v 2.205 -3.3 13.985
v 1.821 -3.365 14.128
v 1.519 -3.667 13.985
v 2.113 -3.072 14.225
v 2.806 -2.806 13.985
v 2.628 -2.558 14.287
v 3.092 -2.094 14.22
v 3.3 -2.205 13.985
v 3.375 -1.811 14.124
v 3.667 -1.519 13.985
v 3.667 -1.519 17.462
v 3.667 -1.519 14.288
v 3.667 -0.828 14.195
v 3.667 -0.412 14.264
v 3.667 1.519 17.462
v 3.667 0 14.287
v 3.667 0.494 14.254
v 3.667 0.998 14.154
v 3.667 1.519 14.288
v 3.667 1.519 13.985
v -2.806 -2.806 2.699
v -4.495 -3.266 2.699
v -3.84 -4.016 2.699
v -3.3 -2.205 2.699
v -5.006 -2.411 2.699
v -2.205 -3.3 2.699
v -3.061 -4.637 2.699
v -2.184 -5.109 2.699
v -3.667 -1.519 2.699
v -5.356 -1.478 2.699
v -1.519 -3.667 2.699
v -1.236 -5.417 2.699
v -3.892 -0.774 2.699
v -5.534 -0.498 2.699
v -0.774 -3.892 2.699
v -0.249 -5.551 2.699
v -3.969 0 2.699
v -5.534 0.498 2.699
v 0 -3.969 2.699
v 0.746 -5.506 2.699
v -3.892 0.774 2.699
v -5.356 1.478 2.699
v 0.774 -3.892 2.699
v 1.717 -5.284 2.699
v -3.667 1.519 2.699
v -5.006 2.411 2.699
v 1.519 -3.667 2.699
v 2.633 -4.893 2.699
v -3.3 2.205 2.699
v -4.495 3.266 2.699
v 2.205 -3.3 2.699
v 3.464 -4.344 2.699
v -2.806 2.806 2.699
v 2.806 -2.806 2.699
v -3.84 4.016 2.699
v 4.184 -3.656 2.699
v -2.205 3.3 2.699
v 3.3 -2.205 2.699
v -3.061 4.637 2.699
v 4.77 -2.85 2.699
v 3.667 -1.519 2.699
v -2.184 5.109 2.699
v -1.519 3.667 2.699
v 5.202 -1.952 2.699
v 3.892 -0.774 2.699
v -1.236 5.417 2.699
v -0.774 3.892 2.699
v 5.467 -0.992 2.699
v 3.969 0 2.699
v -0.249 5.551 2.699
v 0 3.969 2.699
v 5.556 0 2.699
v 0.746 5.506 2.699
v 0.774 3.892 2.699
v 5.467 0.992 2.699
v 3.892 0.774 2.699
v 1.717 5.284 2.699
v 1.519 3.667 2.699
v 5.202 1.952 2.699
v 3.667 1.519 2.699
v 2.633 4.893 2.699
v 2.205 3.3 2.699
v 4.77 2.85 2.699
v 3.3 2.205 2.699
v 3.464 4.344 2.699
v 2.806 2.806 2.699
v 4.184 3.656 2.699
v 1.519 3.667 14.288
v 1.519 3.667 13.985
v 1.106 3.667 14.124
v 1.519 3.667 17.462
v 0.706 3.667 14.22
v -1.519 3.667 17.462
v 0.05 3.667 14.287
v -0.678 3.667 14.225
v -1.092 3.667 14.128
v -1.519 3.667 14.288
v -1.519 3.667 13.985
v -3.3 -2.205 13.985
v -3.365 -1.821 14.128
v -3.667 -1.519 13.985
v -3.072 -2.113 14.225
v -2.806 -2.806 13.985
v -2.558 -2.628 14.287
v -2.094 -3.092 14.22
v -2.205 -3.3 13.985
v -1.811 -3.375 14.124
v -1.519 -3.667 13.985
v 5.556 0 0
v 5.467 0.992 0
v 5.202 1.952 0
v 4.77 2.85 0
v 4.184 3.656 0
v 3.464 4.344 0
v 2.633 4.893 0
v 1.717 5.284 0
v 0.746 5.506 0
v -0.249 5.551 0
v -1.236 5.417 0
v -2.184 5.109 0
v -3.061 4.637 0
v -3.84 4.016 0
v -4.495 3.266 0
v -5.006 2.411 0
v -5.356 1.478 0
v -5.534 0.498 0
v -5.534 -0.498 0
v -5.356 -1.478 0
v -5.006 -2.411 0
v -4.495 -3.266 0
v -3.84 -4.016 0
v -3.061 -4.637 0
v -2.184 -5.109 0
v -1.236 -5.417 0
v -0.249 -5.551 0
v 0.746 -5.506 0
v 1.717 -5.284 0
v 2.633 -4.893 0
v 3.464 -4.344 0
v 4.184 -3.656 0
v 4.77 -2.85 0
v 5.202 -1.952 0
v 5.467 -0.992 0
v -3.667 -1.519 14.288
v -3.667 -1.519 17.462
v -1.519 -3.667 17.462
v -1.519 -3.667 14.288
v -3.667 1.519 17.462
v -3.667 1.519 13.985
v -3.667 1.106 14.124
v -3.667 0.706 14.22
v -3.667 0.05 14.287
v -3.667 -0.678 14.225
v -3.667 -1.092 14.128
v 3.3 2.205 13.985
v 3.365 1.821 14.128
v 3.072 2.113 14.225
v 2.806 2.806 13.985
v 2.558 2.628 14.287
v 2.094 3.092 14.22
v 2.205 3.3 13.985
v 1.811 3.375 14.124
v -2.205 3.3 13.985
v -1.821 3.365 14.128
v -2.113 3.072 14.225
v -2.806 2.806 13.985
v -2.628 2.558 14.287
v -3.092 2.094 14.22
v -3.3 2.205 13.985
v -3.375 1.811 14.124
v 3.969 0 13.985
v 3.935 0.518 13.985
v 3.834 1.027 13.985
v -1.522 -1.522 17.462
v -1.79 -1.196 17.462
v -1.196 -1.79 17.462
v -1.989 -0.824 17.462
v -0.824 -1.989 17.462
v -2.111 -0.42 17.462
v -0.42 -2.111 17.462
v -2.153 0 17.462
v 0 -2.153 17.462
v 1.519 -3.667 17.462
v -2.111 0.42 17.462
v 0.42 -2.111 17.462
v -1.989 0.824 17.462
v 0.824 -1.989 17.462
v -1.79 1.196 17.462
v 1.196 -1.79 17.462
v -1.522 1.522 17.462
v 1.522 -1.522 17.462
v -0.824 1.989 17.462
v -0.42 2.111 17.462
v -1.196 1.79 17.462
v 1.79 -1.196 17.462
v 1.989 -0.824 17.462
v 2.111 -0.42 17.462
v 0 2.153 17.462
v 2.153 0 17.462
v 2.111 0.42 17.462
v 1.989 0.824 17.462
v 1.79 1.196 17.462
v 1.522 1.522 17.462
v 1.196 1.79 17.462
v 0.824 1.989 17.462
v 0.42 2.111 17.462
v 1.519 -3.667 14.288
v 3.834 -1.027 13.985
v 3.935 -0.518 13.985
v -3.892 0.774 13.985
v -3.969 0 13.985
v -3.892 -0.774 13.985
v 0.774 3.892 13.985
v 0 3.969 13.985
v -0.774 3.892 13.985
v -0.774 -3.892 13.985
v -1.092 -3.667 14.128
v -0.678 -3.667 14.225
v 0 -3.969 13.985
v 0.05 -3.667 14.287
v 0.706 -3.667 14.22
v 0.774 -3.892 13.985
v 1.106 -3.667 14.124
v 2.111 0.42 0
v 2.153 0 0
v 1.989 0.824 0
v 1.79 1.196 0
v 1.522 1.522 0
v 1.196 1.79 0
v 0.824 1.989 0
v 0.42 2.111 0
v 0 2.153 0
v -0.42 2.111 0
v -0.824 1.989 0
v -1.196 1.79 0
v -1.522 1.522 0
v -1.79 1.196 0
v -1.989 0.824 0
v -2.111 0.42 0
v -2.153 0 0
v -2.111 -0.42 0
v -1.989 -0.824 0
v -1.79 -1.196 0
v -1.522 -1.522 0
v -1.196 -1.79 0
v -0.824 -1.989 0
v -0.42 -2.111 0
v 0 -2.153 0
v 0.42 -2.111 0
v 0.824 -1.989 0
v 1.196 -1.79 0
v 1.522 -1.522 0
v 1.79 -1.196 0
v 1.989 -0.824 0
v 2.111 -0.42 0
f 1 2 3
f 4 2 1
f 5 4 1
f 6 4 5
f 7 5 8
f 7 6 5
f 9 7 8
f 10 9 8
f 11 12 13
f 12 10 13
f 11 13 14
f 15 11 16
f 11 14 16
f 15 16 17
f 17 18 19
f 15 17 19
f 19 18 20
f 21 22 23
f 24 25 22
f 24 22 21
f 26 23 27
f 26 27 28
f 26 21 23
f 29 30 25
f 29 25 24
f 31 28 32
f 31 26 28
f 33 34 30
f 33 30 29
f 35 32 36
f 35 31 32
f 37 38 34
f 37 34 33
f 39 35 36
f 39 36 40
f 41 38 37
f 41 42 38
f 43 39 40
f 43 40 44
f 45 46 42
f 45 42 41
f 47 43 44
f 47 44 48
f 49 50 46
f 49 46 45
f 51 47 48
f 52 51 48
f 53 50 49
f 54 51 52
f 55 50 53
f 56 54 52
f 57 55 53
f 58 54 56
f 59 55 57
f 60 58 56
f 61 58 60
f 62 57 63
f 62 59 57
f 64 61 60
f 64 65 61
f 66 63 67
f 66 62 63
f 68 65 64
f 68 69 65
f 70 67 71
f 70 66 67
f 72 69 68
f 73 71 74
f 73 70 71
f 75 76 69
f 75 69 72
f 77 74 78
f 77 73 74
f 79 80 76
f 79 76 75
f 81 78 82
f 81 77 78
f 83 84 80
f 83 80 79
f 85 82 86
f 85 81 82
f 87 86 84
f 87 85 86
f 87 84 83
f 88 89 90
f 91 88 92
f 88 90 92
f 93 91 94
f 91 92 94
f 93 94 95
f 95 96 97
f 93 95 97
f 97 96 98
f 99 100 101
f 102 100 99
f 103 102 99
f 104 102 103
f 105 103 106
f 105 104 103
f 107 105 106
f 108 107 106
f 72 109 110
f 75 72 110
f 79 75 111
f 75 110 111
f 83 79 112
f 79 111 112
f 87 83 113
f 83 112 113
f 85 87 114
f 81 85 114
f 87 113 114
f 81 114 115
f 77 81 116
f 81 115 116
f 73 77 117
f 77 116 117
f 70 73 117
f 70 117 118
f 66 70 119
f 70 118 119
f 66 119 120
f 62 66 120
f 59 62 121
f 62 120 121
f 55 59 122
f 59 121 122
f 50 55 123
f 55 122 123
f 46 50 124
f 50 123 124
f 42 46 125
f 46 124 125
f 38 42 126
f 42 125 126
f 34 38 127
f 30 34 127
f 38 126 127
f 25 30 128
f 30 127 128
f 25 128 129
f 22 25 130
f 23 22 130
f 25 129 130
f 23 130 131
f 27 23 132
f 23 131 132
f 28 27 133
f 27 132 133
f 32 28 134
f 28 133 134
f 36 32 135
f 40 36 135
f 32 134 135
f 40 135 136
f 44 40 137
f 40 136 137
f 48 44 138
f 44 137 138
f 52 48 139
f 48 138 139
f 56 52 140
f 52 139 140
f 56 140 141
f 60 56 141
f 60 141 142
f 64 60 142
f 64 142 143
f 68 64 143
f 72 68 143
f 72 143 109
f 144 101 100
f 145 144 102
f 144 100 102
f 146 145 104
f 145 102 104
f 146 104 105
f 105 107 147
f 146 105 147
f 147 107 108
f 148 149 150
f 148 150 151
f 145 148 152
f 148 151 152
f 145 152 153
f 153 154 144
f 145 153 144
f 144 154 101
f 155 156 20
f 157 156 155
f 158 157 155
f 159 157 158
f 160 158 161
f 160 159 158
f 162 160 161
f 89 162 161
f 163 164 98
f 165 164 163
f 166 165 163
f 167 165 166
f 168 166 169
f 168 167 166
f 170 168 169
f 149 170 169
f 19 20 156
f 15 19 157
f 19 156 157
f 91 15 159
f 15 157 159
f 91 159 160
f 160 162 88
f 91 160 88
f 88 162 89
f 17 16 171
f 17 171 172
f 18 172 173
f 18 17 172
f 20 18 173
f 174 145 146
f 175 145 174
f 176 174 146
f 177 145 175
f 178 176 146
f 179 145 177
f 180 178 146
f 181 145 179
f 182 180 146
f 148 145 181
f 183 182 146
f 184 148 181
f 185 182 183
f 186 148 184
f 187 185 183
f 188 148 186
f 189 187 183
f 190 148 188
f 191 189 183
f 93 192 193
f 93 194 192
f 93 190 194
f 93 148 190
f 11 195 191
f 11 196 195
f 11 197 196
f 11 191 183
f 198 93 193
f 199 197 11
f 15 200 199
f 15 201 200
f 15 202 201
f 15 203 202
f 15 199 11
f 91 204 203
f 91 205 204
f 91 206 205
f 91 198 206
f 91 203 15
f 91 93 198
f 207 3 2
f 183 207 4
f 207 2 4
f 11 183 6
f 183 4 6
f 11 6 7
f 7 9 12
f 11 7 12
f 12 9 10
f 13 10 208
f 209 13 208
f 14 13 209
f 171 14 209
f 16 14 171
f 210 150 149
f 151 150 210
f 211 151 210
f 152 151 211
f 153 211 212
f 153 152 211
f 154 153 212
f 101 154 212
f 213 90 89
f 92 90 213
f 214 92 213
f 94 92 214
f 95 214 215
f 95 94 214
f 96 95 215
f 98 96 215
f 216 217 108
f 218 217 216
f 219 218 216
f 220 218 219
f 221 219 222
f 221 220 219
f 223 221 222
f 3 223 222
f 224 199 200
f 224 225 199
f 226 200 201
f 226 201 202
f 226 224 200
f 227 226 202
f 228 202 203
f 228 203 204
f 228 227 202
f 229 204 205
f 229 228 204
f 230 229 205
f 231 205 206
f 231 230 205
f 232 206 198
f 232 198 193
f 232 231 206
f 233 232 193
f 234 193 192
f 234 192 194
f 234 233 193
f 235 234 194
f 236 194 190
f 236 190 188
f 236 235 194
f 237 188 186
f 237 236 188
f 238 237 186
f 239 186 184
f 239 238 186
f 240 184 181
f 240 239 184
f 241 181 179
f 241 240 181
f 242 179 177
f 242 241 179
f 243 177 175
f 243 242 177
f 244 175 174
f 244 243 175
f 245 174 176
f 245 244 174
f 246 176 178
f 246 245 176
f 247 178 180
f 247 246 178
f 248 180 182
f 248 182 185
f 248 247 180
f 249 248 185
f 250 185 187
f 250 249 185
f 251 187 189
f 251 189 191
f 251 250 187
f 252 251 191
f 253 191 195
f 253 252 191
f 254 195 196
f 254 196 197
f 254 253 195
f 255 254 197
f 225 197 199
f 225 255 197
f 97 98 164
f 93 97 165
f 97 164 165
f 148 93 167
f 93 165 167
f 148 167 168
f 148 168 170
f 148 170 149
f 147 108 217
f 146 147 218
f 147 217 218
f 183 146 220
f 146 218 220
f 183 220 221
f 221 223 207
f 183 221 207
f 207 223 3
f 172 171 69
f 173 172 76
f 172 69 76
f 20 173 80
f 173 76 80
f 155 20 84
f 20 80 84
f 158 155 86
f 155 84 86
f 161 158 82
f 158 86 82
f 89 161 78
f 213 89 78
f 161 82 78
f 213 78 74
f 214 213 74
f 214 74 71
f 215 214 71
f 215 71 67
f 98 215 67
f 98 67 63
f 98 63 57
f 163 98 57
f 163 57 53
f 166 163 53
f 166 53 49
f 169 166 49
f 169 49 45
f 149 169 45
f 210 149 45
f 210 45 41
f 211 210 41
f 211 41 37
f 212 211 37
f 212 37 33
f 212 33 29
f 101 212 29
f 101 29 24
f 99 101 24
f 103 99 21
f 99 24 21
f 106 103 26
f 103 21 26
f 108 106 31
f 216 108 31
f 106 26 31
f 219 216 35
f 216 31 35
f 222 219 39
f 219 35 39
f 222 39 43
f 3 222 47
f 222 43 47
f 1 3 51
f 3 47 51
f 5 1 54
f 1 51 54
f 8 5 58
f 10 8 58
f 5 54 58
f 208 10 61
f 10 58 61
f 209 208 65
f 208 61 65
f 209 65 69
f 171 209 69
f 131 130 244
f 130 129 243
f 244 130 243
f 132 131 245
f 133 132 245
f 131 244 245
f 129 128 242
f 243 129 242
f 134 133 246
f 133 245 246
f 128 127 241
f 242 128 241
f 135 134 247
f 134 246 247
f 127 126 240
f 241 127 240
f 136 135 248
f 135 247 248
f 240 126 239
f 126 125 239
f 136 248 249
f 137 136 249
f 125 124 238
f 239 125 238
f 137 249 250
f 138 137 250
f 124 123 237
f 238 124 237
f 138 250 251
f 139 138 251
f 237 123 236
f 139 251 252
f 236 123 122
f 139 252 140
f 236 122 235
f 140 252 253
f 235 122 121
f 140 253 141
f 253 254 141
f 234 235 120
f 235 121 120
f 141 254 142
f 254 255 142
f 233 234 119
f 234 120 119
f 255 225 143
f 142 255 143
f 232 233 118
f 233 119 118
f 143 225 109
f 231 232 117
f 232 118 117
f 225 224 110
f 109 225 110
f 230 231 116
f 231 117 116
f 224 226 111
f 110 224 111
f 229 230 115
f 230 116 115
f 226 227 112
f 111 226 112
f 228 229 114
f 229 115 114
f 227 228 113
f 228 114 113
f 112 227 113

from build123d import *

# Parameters (mm, degrees)
F0_R         = 5.55625
F0_R_2       = 2.15265
F1_DEPTH     = 2.69875
F2_R         = 3.96875
F2_R_2       = 2.15265
F3_DEPTH     = 11.58875
F4_R         = 2.15265
F5_DEPTH     = 3.175
F6_T4_ANGLE  = 45
F6_T9_ANGLE  = 45
F6_T14_ANGLE = 45
F6_T19_ANGLE = 45
F6_T24_ANGLE = 45
F6_T29_ANGLE = 45
F6_T34_ANGLE = 45
F6_T39_ANGLE = 22.5
F6_T44_ANGLE = 22.5


# Not quite as in the source:
# - a fillet or chamfer that OpenCascade refuses, or shapes differently, is made with other operations: its cross-section is extruded or revolved along the edge and cut away or added


with BuildPart() as f1:
    # F0 (on Top) → F1 (new body)
    with BuildSketch(Plane.XY):
        Circle(F0_R)
        Circle(F0_R_2, mode=Mode.SUBTRACT)
    extrude(amount=F1_DEPTH)

    # F2 (on face) → F3 (join)
    with BuildSketch(Plane.XY.offset(2.69875)):
        Circle(F2_R)
        Circle(F2_R_2, mode=Mode.SUBTRACT)
    extrude(amount=F3_DEPTH)

    # F4 (on face) → F5 (join)
    with BuildSketch(Plane.XY.offset(14.2875)):
        Polygon((-3.6666468947, 1.5187748722), (-3.6666468947, -1.5187748722), (-1.5187748722, -3.6666468947), (1.5187748722, -3.6666468947), (3.6666468947, -1.5187748722), (3.6666468947, 1.5187748722), (1.5187748722, 3.6666468947), (-1.5187748722, 3.6666468947), align=None)
        Circle(F4_R, mode=Mode.SUBTRACT)
    extrude(amount=F5_DEPTH)

    # F6: chamfer of 0.3021076 on 7 edges, made by hand


with BuildPart() as f6_tool2:
    # F6_s3 → F6_t4 (revolve)
    with BuildSketch(Plane(origin=(0, 0, 0), x_dir=(0, 0, 1), z_dir=(0.3826834324, 0.9238795325, 0))):
        Polygon((13.9853924, -3.96875), (14.2875, -3.6666424), (14.2875, -3.96875), align=None)
    revolve(axis=Axis((0, 0, 14.2875), (0, 0, 1)), revolution_arc=F6_T4_ANGLE)

    split(bisect_by=Plane.YZ.offset(-3.6666468947), keep=Keep.BOTTOM)


with BuildPart() as f1_1:
    add(f1.part)

    # F6_t1: cut F6_tool2
    add(f6_tool2.part, mode=Mode.SUBTRACT)


with BuildPart() as f6_tool7:
    # F6_s8 → F6_t9 (revolve)
    with BuildSketch(Plane(origin=(0, 0, 0), x_dir=(0, 0, 1), z_dir=(0.9238795325, 0.3826834324, 0))):
        Polygon((13.9853924, -3.96875), (14.2875, -3.6666424), (14.2875, -3.96875), align=None)
    revolve(axis=Axis((0, 0, 14.2875), (0, 0, 1)), revolution_arc=F6_T9_ANGLE)

    split(bisect_by=Plane(origin=(-2.5927108834, 2.5927108834, 0), x_dir=(0, 0, 1), z_dir=(-0.7071067812, 0.7071067812, 0)), keep=Keep.TOP)


with BuildPart() as f1_2:
    add(f1_1.part)

    # F6_t6: cut F6_tool7
    add(f6_tool7.part, mode=Mode.SUBTRACT)


with BuildPart() as f6_tool12:
    # F6_s13 → F6_t14 (revolve)
    with BuildSketch(Plane(origin=(0, 0, 0), x_dir=(0, 0, 1), z_dir=(0.9238795325, -0.3826834324, 0))):
        Polygon((13.9853924, -3.96875), (14.2875, -3.6666424), (14.2875, -3.96875), align=None)
    revolve(axis=Axis((0, 0, 14.2875), (0, 0, 1)), revolution_arc=F6_T14_ANGLE)

    split(bisect_by=Plane.XZ.offset(-3.6666468947), keep=Keep.BOTTOM)


with BuildPart() as f1_3:
    add(f1_2.part)

    # F6_t11: cut F6_tool12
    add(f6_tool12.part, mode=Mode.SUBTRACT)


with BuildPart() as f6_tool17:
    # F6_s18 → F6_t19 (revolve)
    with BuildSketch(Plane(origin=(0, 0, 0), x_dir=(0, 0, 1), z_dir=(0.3826834324, -0.9238795325, 0))):
        Polygon((13.9853924, -3.96875), (14.2875, -3.6666424), (14.2875, -3.96875), align=None)
    revolve(axis=Axis((0, 0, 14.2875), (0, 0, 1)), revolution_arc=F6_T19_ANGLE)

    split(bisect_by=Plane(origin=(2.5927108834, 2.5927108834, 0), x_dir=(0, 0, 1), z_dir=(0.7071067812, 0.7071067812, 0)), keep=Keep.TOP)


with BuildPart() as f1_4:
    add(f1_3.part)

    # F6_t16: cut F6_tool17
    add(f6_tool17.part, mode=Mode.SUBTRACT)


with BuildPart() as f6_tool22:
    # F6_s23 → F6_t24 (revolve)
    with BuildSketch(Plane(origin=(0, 0, 0), x_dir=(0, 0, 1), z_dir=(-0.9238795325, -0.3826834324, 0))):
        Polygon((13.9853924, -3.96875), (14.2875, -3.6666424), (14.2875, -3.96875), align=None)
    revolve(axis=Axis((0, 0, 14.2875), (0, 0, 1)), revolution_arc=F6_T24_ANGLE)

    split(bisect_by=Plane(origin=(2.5927108834, -2.5927108834, 0), x_dir=(0, 0, 1), z_dir=(0.7071067812, -0.7071067812, 0)), keep=Keep.TOP)


with BuildPart() as f1_5:
    add(f1_4.part)

    # F6_t21: cut F6_tool22
    add(f6_tool22.part, mode=Mode.SUBTRACT)


with BuildPart() as f6_tool27:
    # F6_s28 → F6_t29 (revolve)
    with BuildSketch(Plane(origin=(0, 0, 0), x_dir=(0, 0, 1), z_dir=(-0.9238795325, 0.3826834324, 0))):
        Polygon((13.9853924, -3.96875), (14.2875, -3.6666424), (14.2875, -3.96875), align=None)
    revolve(axis=Axis((0, 0, 14.2875), (0, 0, 1)), revolution_arc=F6_T29_ANGLE)

    split(bisect_by=Plane.XZ.offset(3.6666468947), keep=Keep.TOP)


with BuildPart() as f1_6:
    add(f1_5.part)

    # F6_t26: cut F6_tool27
    add(f6_tool27.part, mode=Mode.SUBTRACT)


with BuildPart() as f6_tool32:
    # F6_s33 → F6_t34 (revolve)
    with BuildSketch(Plane(origin=(0, 0, 0), x_dir=(0, 0, 1), z_dir=(-0.3826834324, 0.9238795325, 0))):
        Polygon((13.9853924, -3.96875), (14.2875, -3.6666424), (14.2875, -3.96875), align=None)
    revolve(axis=Axis((0, 0, 14.2875), (0, 0, 1)), revolution_arc=F6_T34_ANGLE)

    split(bisect_by=Plane(origin=(-2.5927108834, -2.5927108834, 0), x_dir=(0, 0, 1), z_dir=(-0.7071067812, -0.7071067812, 0)), keep=Keep.TOP)


with BuildPart() as f1_7:
    add(f1_6.part)

    # F6_t31: cut F6_tool32
    add(f6_tool32.part, mode=Mode.SUBTRACT)


with BuildPart() as f6_tool37:
    # F6_s38 → F6_t39 (revolve)
    with BuildSketch(Plane(origin=(0, 0, 0), x_dir=(0, 0, 1), z_dir=(-0.3826834324, -0.9238795325, 0))):
        Polygon((13.9853924, -3.96875), (14.2875, -3.6666424), (14.2875, -3.96875), align=None)
    revolve(axis=Axis((0, 0, 14.2875), (0, 0, 1)), revolution_arc=F6_T39_ANGLE)

    split(bisect_by=Plane.YZ.offset(3.6666468947), keep=Keep.TOP)


with BuildPart() as f1_8:
    add(f1_7.part)

    # F6_t36: cut F6_tool37
    add(f6_tool37.part, mode=Mode.SUBTRACT)


with BuildPart() as f6_tool42:
    # F6_s43 → F6_t44 (revolve)
    with BuildSketch(Plane.XZ):
        Polygon((3.96875, 13.9853924), (3.6666424, 14.2875), (3.96875, 14.2875), align=None)
    revolve(axis=Axis((0, 0, 14.2875), (0, 0, 1)), revolution_arc=F6_T44_ANGLE)

    split(bisect_by=Plane.YZ.offset(3.6666468947), keep=Keep.TOP)


with BuildPart() as f1_9:
    add(f1_8.part)

    # F6_t41: cut F6_tool42
    add(f6_tool42.part, mode=Mode.SUBTRACT)


solid = f1_9.part
